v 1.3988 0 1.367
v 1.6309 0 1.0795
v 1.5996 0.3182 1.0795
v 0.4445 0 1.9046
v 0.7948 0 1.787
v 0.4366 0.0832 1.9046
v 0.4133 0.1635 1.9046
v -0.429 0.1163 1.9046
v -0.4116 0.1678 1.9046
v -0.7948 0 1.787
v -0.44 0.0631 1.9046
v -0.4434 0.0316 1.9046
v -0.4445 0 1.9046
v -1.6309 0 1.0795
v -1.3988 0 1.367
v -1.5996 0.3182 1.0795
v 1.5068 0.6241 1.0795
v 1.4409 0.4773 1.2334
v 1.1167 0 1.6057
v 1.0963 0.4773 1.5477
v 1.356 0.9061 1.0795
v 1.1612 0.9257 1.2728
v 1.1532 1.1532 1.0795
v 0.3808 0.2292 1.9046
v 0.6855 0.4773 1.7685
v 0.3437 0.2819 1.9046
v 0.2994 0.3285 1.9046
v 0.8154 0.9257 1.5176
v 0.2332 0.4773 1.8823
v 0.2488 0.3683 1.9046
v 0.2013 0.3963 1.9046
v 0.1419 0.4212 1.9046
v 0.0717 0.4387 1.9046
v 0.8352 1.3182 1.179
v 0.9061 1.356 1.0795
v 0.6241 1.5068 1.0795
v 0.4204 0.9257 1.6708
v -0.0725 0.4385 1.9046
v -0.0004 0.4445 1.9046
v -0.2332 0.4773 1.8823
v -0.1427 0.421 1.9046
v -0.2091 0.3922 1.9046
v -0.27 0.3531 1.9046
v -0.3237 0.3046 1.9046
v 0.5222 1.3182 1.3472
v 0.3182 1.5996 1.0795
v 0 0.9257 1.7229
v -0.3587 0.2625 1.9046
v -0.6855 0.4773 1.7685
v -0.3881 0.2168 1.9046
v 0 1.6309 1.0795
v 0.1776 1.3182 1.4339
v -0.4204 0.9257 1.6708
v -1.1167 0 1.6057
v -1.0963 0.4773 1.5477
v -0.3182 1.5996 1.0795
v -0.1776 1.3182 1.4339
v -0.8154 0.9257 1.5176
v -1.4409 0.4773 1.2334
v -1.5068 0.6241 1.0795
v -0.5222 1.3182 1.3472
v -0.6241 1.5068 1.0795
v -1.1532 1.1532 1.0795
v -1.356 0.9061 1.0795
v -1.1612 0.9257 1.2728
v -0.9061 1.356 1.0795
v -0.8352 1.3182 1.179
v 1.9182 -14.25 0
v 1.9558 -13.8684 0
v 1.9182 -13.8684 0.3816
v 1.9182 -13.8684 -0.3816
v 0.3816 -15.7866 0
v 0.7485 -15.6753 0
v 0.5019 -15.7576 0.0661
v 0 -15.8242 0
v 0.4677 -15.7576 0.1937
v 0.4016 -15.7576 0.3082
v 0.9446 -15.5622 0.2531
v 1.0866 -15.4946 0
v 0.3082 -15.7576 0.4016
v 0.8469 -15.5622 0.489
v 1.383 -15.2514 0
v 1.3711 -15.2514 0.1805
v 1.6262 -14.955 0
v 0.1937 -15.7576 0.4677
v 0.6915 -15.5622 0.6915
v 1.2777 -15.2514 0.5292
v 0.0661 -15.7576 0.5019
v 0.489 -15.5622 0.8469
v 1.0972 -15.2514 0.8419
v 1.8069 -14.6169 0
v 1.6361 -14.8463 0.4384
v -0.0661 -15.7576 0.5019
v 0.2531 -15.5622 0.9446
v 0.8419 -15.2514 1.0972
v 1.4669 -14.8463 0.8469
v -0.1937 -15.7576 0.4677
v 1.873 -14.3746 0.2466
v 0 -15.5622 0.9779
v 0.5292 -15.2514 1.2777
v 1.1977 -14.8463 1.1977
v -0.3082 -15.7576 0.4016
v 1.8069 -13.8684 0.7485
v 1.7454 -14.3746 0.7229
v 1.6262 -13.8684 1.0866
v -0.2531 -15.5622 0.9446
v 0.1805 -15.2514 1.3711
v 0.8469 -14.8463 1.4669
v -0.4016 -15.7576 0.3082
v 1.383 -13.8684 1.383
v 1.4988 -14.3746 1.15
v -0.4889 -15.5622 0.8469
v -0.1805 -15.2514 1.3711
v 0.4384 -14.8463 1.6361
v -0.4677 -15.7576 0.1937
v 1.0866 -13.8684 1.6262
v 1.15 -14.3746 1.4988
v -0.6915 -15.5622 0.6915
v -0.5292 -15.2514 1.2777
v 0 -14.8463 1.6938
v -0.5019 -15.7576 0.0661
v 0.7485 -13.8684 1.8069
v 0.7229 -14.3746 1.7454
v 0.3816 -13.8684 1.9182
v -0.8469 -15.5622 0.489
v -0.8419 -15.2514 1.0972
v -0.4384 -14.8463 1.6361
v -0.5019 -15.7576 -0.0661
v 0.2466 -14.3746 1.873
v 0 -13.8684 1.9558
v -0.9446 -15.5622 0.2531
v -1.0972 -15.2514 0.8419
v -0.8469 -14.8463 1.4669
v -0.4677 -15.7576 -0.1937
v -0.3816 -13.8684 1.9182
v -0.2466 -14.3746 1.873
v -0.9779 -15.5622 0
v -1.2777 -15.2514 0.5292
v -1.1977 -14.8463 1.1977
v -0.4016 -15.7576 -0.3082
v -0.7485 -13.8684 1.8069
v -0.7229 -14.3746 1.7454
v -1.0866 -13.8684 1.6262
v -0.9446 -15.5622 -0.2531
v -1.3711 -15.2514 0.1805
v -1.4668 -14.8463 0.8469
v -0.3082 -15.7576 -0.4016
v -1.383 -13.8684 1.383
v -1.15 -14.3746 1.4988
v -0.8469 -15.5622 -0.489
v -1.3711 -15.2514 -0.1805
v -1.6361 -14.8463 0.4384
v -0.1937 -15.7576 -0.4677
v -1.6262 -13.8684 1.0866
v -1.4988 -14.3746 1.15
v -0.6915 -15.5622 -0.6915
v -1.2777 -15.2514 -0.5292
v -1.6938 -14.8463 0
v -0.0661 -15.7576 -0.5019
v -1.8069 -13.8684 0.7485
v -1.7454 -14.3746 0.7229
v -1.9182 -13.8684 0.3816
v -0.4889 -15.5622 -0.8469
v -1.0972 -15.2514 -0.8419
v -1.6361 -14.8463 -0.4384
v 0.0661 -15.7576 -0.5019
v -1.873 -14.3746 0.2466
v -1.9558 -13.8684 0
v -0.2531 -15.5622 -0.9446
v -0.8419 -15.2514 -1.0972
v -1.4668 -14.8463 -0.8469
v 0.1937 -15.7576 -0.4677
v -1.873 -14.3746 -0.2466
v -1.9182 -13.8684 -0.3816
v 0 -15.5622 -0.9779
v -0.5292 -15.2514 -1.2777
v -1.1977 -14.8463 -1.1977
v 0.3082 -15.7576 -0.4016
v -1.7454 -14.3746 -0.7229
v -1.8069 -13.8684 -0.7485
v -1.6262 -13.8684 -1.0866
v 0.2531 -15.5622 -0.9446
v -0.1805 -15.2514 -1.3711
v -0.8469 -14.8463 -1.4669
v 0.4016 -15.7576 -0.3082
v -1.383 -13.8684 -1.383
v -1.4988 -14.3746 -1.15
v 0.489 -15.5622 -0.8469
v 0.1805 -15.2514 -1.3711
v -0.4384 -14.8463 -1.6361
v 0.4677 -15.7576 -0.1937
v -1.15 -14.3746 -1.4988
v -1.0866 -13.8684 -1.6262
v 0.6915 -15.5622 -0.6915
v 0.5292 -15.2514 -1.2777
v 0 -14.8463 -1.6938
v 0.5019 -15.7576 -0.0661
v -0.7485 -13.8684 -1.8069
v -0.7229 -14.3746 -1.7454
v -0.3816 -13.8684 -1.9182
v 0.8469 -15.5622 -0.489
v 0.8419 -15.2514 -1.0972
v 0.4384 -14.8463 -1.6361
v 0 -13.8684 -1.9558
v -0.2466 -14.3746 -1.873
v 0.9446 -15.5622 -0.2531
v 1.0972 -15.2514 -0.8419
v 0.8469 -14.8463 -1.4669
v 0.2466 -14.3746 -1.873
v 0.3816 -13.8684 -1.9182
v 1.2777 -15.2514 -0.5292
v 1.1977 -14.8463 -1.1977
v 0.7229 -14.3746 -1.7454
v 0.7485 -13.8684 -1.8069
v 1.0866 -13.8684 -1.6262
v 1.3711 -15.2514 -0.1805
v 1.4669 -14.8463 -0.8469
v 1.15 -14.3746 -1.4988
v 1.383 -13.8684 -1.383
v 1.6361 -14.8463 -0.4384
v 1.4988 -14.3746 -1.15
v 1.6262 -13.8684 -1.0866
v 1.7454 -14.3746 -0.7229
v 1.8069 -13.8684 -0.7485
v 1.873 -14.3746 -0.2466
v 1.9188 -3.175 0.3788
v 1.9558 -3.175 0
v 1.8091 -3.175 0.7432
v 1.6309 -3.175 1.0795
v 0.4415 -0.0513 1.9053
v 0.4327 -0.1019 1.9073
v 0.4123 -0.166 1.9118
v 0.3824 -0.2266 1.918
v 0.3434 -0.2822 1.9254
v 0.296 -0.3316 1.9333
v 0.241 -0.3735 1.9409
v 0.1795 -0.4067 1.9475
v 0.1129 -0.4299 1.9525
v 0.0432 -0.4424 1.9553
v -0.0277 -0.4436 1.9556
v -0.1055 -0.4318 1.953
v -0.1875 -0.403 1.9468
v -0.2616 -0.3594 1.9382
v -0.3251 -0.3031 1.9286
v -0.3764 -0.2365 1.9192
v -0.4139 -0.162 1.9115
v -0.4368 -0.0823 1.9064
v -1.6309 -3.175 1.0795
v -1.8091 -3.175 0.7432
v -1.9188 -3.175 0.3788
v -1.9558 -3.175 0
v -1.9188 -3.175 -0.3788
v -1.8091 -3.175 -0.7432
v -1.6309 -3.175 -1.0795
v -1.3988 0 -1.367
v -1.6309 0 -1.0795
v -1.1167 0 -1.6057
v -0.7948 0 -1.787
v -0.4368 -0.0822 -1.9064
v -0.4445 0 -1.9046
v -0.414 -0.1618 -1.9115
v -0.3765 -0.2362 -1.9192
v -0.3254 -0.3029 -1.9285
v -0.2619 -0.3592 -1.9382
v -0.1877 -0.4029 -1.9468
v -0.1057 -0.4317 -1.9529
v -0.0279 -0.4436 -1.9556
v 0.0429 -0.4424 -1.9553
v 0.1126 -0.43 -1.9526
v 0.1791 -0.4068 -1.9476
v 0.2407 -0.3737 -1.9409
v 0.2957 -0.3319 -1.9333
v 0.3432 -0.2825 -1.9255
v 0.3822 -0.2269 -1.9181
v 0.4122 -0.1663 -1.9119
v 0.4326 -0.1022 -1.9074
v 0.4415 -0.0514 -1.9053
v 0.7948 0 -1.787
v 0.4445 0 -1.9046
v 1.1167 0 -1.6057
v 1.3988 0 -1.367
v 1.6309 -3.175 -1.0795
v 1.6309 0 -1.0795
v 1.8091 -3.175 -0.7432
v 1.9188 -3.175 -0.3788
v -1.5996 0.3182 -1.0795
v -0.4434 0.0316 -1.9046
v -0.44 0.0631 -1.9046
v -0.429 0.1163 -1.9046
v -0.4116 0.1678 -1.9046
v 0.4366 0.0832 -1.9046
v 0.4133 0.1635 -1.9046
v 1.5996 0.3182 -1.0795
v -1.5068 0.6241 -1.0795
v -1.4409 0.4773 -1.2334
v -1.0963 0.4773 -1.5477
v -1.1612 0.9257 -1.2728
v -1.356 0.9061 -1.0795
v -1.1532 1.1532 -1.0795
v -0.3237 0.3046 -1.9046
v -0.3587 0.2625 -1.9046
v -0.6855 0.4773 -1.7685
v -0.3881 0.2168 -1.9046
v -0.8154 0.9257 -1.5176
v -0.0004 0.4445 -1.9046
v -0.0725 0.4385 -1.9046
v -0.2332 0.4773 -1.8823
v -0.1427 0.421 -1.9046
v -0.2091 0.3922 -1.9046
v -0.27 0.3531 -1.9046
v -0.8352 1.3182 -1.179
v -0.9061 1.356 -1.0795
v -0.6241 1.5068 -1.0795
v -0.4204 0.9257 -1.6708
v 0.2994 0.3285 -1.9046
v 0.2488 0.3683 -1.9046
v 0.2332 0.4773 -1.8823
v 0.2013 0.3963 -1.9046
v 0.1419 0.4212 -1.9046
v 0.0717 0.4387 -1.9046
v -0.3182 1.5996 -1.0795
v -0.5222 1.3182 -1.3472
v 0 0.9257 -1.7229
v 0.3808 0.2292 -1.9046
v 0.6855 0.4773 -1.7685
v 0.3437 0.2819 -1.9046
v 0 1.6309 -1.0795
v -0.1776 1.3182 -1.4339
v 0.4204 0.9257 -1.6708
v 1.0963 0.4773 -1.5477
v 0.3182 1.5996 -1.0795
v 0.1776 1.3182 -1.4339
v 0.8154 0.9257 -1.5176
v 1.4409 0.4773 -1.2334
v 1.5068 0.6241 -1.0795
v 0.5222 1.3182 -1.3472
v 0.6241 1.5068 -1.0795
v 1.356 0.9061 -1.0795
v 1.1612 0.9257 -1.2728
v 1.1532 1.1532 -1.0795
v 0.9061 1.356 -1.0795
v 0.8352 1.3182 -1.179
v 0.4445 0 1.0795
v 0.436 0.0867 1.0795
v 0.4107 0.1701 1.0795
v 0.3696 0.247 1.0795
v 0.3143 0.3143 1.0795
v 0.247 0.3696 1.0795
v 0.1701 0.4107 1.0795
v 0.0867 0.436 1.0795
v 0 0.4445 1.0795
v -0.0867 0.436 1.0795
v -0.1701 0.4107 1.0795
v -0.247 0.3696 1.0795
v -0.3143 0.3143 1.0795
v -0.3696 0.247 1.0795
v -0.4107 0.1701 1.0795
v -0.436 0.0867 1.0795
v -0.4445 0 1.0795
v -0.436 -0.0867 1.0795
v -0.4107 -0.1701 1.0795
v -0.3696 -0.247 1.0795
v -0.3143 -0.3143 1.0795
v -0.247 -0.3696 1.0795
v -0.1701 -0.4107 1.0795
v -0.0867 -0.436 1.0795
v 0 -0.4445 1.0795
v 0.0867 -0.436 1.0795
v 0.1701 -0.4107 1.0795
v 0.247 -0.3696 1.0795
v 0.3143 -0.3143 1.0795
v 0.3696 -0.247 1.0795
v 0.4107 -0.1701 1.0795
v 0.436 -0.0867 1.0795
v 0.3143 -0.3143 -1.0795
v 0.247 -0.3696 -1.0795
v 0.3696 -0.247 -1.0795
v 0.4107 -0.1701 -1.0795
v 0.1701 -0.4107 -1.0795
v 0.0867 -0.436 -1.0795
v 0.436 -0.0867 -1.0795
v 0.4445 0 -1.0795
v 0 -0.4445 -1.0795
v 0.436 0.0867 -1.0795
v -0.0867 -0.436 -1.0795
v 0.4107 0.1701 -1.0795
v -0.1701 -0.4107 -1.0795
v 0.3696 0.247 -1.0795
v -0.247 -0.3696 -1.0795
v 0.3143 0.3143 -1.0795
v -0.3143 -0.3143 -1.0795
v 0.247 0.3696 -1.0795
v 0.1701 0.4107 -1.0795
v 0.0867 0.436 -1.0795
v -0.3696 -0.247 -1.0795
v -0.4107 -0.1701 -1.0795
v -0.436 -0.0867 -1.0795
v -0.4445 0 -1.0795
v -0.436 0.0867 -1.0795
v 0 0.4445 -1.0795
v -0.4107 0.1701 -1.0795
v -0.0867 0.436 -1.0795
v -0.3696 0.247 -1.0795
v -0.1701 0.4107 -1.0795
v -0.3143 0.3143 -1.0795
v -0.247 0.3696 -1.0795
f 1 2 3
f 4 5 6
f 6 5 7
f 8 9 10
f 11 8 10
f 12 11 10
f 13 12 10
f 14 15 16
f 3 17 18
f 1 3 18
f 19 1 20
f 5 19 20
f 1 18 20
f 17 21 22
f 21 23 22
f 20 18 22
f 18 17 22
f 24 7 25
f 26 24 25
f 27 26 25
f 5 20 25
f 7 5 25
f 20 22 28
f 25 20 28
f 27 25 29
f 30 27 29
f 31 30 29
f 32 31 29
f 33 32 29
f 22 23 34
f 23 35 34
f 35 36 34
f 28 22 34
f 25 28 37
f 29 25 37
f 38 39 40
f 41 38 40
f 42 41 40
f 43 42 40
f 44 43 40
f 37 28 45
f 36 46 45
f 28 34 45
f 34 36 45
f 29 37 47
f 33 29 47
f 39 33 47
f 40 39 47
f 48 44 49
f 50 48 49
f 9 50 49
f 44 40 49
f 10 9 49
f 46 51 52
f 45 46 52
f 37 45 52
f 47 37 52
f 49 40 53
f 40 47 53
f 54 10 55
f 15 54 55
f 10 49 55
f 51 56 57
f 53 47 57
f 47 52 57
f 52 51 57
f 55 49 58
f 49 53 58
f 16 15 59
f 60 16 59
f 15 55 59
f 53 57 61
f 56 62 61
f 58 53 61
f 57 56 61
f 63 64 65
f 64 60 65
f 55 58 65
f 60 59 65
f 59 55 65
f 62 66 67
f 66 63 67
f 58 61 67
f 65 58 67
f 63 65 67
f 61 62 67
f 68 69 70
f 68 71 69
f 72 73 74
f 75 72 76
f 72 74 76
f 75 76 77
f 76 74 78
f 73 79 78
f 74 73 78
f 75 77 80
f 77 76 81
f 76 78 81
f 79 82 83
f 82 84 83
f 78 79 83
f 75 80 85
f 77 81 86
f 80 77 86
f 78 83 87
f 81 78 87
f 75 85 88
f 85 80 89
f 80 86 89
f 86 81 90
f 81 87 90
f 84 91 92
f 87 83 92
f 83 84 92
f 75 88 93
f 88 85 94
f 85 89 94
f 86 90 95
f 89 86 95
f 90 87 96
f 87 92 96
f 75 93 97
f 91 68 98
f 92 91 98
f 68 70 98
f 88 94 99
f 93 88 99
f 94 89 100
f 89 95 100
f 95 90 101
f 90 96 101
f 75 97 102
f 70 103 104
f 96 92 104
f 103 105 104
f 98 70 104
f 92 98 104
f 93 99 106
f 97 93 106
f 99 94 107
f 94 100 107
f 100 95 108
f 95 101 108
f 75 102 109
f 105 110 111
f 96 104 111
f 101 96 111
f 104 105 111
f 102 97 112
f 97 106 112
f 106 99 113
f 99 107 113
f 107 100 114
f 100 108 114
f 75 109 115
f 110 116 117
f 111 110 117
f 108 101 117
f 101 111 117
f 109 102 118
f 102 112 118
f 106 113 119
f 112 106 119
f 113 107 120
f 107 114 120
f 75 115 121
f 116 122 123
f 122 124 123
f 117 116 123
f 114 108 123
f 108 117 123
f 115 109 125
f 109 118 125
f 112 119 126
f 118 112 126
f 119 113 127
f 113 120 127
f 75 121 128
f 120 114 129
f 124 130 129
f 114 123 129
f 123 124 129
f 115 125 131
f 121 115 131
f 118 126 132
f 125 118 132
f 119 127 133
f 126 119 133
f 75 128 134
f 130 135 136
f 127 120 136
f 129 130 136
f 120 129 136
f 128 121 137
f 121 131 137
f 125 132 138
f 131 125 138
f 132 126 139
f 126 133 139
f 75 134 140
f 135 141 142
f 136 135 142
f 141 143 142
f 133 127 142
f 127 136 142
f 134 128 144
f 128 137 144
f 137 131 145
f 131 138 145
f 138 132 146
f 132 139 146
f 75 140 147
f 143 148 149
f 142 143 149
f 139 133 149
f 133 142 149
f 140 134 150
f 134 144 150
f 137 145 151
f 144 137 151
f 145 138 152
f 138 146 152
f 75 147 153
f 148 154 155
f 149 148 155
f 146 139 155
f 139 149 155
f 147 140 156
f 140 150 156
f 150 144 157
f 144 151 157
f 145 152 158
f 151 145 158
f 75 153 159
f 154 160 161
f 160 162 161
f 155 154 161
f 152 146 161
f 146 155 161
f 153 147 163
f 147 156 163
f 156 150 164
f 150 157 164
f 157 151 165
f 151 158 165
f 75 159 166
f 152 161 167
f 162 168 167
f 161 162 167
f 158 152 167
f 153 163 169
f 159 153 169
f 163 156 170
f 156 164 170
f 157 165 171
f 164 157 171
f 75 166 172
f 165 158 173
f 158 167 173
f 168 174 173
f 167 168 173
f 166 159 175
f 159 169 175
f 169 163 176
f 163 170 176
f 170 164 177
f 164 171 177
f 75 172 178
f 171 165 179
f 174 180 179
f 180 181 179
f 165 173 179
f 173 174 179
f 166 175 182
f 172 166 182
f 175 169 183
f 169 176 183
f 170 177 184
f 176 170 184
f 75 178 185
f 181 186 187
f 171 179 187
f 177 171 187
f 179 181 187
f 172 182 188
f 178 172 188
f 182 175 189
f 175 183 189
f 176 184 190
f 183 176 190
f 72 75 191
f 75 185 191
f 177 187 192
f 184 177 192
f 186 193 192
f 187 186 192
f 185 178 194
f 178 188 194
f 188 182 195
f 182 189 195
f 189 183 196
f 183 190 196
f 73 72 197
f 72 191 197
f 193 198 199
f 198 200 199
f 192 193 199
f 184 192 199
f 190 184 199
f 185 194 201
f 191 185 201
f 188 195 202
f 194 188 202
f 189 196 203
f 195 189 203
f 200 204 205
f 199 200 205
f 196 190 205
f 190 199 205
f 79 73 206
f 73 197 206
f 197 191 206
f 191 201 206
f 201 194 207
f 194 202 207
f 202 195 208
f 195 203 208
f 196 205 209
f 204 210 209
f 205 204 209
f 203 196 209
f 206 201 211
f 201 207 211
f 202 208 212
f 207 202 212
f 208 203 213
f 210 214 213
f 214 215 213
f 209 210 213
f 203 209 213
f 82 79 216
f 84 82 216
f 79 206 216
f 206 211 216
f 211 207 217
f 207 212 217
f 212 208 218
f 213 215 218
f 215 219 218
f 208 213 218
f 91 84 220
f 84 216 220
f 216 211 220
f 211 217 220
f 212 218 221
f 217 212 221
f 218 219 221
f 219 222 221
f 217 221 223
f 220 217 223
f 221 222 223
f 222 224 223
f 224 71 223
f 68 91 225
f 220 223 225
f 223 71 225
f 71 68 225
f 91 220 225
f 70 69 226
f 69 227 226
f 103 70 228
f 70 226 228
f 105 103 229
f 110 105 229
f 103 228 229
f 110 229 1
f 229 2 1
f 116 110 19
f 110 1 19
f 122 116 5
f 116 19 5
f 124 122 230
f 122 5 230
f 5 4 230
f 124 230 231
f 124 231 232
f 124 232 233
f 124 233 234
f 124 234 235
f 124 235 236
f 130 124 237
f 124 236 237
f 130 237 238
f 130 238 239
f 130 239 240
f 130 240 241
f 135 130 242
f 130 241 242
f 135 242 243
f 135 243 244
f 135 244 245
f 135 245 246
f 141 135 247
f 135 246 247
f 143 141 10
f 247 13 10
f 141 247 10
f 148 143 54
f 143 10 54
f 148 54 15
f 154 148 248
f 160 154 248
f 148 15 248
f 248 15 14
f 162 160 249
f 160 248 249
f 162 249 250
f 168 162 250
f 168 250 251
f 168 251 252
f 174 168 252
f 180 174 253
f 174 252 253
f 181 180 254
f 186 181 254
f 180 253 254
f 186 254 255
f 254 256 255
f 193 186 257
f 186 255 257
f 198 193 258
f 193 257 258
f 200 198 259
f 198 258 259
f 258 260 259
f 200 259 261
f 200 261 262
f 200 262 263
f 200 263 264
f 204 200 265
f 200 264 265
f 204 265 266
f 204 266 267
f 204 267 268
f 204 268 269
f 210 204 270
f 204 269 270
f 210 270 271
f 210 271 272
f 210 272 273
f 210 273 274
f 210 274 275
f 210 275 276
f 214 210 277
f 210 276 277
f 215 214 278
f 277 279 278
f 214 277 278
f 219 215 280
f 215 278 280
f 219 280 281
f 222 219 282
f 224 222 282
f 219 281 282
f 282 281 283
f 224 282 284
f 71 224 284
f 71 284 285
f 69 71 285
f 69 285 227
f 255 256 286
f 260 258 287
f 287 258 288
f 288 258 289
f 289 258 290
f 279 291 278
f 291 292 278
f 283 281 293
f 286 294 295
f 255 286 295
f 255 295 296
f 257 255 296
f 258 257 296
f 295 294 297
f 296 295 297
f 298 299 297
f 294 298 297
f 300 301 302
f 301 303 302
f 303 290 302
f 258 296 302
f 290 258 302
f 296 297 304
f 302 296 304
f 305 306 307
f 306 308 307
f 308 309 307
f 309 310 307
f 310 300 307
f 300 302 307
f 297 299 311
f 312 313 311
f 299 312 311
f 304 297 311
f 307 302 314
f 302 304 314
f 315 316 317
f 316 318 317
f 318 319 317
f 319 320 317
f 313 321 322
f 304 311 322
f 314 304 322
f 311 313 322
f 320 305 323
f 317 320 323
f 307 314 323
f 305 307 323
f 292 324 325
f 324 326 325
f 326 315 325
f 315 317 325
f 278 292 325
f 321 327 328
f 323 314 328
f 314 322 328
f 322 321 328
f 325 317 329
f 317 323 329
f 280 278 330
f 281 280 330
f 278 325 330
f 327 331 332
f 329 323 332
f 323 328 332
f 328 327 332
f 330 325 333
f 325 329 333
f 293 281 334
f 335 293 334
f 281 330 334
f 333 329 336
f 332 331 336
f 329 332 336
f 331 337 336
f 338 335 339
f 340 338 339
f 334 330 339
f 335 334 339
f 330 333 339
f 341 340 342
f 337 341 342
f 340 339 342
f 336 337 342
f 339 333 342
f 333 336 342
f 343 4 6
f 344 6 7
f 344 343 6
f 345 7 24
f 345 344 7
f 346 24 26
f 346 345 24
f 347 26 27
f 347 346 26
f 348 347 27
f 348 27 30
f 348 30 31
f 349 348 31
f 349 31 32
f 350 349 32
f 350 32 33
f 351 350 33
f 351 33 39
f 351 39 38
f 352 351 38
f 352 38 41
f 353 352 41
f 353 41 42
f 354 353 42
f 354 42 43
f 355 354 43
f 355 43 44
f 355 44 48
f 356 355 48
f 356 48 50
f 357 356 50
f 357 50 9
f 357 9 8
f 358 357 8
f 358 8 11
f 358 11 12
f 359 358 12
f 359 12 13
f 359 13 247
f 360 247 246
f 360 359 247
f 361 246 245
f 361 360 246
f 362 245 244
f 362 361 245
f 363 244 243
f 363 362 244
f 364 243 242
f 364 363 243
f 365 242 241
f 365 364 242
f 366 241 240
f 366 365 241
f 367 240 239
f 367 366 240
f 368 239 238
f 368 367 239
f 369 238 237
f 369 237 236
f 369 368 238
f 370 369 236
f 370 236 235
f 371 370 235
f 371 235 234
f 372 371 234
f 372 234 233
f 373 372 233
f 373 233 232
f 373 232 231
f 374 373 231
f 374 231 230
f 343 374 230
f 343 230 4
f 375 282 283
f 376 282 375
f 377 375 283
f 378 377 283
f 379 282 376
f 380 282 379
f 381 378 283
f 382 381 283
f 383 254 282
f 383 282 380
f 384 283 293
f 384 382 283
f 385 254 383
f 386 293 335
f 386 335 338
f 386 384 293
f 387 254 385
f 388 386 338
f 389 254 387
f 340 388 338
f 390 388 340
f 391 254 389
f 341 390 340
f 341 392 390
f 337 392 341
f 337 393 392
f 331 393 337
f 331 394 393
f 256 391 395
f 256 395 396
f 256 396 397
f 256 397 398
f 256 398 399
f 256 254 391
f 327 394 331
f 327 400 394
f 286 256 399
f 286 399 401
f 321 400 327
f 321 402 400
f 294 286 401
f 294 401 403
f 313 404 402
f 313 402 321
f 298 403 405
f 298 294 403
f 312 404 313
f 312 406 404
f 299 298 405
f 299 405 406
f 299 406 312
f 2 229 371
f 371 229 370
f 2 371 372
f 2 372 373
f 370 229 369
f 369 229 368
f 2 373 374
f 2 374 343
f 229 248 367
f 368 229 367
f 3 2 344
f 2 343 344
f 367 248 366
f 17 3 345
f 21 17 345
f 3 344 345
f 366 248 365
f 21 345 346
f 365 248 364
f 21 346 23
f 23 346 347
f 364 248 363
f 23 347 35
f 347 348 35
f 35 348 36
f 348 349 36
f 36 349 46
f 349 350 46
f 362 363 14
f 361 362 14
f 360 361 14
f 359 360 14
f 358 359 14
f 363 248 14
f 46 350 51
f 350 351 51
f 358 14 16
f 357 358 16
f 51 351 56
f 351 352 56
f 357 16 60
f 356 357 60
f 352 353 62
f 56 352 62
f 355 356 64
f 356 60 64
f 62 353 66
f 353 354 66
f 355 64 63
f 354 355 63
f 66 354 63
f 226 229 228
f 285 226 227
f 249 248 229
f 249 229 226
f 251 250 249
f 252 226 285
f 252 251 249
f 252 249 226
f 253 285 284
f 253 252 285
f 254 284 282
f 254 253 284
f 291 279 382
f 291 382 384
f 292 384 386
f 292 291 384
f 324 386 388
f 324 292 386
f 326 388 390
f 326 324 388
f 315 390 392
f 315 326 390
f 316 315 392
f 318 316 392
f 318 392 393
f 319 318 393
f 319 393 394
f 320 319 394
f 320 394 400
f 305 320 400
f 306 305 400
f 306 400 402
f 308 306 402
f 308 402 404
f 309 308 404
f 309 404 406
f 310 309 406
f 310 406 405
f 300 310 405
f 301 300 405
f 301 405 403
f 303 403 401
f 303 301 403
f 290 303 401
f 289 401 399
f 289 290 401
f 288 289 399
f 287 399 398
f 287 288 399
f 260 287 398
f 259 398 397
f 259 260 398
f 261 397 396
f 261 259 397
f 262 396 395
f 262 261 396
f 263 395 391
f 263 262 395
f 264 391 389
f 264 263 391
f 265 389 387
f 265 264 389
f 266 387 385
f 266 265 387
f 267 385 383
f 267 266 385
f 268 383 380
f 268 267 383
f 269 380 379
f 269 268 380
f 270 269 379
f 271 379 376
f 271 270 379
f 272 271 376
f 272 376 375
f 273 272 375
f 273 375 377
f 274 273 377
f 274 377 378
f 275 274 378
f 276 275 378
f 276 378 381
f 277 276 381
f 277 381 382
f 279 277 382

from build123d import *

# Parameters (mm, degrees)
CUT_EXTRUDE1_DEPTH      = 17.064109466
CUT_EXTRUDE1_DEPTH_BACK = 17.064109466
SKETCH2_W               = 2.159
SKETCH2_H               = 5.314367205
CUT_EXTRUDE2_DEPTH      = 17.064109466
CUT_EXTRUDE2_DEPTH_BACK = 17.064109466
SKETCH3_R               = 0.4445


with BuildPart() as part:
    # Sketch1 one side → Revolve1 (revolve)
    with BuildSketch(Plane.XY):
        with BuildLine():
            Line((1.9558, -13.8684), (1.9558, 0))
            ThreePointArc((1.9558, 0), (1.382959443, 1.382959443), (0, 1.9558))
            Line((0, 1.9558), (0, -15.8242))
            ThreePointArc((0, -15.8242), (1.382959443, -15.251359443), (1.9558, -13.8684))
        make_face()
    revolve(axis=Axis((0, 0, 0), (0, -1, 0)))

    # Sketch2 → Cut-Extrude1 (cut, two sides: drawn at the far end of the back side and taken through both)
    with BuildSketch(Plane(origin=(0, 0, 0), x_dir=(0, 0, -1), z_dir=(1, 0, 0)).offset(-CUT_EXTRUDE1_DEPTH_BACK)):
        with Locations((0, -0.517816398)):
            Rectangle(SKETCH2_W, SKETCH2_H)
    extrude(amount=CUT_EXTRUDE1_DEPTH + CUT_EXTRUDE1_DEPTH_BACK, mode=Mode.SUBTRACT)

    # Sketch3 → Cut-Extrude2 (cut, two sides: drawn at the far end of the back side and taken through both)
    with BuildSketch(Plane.XY.offset(-CUT_EXTRUDE2_DEPTH_BACK)):
        Circle(SKETCH3_R)
    extrude(amount=CUT_EXTRUDE2_DEPTH + CUT_EXTRUDE2_DEPTH_BACK, mode=Mode.SUBTRACT)


solid = part.part
